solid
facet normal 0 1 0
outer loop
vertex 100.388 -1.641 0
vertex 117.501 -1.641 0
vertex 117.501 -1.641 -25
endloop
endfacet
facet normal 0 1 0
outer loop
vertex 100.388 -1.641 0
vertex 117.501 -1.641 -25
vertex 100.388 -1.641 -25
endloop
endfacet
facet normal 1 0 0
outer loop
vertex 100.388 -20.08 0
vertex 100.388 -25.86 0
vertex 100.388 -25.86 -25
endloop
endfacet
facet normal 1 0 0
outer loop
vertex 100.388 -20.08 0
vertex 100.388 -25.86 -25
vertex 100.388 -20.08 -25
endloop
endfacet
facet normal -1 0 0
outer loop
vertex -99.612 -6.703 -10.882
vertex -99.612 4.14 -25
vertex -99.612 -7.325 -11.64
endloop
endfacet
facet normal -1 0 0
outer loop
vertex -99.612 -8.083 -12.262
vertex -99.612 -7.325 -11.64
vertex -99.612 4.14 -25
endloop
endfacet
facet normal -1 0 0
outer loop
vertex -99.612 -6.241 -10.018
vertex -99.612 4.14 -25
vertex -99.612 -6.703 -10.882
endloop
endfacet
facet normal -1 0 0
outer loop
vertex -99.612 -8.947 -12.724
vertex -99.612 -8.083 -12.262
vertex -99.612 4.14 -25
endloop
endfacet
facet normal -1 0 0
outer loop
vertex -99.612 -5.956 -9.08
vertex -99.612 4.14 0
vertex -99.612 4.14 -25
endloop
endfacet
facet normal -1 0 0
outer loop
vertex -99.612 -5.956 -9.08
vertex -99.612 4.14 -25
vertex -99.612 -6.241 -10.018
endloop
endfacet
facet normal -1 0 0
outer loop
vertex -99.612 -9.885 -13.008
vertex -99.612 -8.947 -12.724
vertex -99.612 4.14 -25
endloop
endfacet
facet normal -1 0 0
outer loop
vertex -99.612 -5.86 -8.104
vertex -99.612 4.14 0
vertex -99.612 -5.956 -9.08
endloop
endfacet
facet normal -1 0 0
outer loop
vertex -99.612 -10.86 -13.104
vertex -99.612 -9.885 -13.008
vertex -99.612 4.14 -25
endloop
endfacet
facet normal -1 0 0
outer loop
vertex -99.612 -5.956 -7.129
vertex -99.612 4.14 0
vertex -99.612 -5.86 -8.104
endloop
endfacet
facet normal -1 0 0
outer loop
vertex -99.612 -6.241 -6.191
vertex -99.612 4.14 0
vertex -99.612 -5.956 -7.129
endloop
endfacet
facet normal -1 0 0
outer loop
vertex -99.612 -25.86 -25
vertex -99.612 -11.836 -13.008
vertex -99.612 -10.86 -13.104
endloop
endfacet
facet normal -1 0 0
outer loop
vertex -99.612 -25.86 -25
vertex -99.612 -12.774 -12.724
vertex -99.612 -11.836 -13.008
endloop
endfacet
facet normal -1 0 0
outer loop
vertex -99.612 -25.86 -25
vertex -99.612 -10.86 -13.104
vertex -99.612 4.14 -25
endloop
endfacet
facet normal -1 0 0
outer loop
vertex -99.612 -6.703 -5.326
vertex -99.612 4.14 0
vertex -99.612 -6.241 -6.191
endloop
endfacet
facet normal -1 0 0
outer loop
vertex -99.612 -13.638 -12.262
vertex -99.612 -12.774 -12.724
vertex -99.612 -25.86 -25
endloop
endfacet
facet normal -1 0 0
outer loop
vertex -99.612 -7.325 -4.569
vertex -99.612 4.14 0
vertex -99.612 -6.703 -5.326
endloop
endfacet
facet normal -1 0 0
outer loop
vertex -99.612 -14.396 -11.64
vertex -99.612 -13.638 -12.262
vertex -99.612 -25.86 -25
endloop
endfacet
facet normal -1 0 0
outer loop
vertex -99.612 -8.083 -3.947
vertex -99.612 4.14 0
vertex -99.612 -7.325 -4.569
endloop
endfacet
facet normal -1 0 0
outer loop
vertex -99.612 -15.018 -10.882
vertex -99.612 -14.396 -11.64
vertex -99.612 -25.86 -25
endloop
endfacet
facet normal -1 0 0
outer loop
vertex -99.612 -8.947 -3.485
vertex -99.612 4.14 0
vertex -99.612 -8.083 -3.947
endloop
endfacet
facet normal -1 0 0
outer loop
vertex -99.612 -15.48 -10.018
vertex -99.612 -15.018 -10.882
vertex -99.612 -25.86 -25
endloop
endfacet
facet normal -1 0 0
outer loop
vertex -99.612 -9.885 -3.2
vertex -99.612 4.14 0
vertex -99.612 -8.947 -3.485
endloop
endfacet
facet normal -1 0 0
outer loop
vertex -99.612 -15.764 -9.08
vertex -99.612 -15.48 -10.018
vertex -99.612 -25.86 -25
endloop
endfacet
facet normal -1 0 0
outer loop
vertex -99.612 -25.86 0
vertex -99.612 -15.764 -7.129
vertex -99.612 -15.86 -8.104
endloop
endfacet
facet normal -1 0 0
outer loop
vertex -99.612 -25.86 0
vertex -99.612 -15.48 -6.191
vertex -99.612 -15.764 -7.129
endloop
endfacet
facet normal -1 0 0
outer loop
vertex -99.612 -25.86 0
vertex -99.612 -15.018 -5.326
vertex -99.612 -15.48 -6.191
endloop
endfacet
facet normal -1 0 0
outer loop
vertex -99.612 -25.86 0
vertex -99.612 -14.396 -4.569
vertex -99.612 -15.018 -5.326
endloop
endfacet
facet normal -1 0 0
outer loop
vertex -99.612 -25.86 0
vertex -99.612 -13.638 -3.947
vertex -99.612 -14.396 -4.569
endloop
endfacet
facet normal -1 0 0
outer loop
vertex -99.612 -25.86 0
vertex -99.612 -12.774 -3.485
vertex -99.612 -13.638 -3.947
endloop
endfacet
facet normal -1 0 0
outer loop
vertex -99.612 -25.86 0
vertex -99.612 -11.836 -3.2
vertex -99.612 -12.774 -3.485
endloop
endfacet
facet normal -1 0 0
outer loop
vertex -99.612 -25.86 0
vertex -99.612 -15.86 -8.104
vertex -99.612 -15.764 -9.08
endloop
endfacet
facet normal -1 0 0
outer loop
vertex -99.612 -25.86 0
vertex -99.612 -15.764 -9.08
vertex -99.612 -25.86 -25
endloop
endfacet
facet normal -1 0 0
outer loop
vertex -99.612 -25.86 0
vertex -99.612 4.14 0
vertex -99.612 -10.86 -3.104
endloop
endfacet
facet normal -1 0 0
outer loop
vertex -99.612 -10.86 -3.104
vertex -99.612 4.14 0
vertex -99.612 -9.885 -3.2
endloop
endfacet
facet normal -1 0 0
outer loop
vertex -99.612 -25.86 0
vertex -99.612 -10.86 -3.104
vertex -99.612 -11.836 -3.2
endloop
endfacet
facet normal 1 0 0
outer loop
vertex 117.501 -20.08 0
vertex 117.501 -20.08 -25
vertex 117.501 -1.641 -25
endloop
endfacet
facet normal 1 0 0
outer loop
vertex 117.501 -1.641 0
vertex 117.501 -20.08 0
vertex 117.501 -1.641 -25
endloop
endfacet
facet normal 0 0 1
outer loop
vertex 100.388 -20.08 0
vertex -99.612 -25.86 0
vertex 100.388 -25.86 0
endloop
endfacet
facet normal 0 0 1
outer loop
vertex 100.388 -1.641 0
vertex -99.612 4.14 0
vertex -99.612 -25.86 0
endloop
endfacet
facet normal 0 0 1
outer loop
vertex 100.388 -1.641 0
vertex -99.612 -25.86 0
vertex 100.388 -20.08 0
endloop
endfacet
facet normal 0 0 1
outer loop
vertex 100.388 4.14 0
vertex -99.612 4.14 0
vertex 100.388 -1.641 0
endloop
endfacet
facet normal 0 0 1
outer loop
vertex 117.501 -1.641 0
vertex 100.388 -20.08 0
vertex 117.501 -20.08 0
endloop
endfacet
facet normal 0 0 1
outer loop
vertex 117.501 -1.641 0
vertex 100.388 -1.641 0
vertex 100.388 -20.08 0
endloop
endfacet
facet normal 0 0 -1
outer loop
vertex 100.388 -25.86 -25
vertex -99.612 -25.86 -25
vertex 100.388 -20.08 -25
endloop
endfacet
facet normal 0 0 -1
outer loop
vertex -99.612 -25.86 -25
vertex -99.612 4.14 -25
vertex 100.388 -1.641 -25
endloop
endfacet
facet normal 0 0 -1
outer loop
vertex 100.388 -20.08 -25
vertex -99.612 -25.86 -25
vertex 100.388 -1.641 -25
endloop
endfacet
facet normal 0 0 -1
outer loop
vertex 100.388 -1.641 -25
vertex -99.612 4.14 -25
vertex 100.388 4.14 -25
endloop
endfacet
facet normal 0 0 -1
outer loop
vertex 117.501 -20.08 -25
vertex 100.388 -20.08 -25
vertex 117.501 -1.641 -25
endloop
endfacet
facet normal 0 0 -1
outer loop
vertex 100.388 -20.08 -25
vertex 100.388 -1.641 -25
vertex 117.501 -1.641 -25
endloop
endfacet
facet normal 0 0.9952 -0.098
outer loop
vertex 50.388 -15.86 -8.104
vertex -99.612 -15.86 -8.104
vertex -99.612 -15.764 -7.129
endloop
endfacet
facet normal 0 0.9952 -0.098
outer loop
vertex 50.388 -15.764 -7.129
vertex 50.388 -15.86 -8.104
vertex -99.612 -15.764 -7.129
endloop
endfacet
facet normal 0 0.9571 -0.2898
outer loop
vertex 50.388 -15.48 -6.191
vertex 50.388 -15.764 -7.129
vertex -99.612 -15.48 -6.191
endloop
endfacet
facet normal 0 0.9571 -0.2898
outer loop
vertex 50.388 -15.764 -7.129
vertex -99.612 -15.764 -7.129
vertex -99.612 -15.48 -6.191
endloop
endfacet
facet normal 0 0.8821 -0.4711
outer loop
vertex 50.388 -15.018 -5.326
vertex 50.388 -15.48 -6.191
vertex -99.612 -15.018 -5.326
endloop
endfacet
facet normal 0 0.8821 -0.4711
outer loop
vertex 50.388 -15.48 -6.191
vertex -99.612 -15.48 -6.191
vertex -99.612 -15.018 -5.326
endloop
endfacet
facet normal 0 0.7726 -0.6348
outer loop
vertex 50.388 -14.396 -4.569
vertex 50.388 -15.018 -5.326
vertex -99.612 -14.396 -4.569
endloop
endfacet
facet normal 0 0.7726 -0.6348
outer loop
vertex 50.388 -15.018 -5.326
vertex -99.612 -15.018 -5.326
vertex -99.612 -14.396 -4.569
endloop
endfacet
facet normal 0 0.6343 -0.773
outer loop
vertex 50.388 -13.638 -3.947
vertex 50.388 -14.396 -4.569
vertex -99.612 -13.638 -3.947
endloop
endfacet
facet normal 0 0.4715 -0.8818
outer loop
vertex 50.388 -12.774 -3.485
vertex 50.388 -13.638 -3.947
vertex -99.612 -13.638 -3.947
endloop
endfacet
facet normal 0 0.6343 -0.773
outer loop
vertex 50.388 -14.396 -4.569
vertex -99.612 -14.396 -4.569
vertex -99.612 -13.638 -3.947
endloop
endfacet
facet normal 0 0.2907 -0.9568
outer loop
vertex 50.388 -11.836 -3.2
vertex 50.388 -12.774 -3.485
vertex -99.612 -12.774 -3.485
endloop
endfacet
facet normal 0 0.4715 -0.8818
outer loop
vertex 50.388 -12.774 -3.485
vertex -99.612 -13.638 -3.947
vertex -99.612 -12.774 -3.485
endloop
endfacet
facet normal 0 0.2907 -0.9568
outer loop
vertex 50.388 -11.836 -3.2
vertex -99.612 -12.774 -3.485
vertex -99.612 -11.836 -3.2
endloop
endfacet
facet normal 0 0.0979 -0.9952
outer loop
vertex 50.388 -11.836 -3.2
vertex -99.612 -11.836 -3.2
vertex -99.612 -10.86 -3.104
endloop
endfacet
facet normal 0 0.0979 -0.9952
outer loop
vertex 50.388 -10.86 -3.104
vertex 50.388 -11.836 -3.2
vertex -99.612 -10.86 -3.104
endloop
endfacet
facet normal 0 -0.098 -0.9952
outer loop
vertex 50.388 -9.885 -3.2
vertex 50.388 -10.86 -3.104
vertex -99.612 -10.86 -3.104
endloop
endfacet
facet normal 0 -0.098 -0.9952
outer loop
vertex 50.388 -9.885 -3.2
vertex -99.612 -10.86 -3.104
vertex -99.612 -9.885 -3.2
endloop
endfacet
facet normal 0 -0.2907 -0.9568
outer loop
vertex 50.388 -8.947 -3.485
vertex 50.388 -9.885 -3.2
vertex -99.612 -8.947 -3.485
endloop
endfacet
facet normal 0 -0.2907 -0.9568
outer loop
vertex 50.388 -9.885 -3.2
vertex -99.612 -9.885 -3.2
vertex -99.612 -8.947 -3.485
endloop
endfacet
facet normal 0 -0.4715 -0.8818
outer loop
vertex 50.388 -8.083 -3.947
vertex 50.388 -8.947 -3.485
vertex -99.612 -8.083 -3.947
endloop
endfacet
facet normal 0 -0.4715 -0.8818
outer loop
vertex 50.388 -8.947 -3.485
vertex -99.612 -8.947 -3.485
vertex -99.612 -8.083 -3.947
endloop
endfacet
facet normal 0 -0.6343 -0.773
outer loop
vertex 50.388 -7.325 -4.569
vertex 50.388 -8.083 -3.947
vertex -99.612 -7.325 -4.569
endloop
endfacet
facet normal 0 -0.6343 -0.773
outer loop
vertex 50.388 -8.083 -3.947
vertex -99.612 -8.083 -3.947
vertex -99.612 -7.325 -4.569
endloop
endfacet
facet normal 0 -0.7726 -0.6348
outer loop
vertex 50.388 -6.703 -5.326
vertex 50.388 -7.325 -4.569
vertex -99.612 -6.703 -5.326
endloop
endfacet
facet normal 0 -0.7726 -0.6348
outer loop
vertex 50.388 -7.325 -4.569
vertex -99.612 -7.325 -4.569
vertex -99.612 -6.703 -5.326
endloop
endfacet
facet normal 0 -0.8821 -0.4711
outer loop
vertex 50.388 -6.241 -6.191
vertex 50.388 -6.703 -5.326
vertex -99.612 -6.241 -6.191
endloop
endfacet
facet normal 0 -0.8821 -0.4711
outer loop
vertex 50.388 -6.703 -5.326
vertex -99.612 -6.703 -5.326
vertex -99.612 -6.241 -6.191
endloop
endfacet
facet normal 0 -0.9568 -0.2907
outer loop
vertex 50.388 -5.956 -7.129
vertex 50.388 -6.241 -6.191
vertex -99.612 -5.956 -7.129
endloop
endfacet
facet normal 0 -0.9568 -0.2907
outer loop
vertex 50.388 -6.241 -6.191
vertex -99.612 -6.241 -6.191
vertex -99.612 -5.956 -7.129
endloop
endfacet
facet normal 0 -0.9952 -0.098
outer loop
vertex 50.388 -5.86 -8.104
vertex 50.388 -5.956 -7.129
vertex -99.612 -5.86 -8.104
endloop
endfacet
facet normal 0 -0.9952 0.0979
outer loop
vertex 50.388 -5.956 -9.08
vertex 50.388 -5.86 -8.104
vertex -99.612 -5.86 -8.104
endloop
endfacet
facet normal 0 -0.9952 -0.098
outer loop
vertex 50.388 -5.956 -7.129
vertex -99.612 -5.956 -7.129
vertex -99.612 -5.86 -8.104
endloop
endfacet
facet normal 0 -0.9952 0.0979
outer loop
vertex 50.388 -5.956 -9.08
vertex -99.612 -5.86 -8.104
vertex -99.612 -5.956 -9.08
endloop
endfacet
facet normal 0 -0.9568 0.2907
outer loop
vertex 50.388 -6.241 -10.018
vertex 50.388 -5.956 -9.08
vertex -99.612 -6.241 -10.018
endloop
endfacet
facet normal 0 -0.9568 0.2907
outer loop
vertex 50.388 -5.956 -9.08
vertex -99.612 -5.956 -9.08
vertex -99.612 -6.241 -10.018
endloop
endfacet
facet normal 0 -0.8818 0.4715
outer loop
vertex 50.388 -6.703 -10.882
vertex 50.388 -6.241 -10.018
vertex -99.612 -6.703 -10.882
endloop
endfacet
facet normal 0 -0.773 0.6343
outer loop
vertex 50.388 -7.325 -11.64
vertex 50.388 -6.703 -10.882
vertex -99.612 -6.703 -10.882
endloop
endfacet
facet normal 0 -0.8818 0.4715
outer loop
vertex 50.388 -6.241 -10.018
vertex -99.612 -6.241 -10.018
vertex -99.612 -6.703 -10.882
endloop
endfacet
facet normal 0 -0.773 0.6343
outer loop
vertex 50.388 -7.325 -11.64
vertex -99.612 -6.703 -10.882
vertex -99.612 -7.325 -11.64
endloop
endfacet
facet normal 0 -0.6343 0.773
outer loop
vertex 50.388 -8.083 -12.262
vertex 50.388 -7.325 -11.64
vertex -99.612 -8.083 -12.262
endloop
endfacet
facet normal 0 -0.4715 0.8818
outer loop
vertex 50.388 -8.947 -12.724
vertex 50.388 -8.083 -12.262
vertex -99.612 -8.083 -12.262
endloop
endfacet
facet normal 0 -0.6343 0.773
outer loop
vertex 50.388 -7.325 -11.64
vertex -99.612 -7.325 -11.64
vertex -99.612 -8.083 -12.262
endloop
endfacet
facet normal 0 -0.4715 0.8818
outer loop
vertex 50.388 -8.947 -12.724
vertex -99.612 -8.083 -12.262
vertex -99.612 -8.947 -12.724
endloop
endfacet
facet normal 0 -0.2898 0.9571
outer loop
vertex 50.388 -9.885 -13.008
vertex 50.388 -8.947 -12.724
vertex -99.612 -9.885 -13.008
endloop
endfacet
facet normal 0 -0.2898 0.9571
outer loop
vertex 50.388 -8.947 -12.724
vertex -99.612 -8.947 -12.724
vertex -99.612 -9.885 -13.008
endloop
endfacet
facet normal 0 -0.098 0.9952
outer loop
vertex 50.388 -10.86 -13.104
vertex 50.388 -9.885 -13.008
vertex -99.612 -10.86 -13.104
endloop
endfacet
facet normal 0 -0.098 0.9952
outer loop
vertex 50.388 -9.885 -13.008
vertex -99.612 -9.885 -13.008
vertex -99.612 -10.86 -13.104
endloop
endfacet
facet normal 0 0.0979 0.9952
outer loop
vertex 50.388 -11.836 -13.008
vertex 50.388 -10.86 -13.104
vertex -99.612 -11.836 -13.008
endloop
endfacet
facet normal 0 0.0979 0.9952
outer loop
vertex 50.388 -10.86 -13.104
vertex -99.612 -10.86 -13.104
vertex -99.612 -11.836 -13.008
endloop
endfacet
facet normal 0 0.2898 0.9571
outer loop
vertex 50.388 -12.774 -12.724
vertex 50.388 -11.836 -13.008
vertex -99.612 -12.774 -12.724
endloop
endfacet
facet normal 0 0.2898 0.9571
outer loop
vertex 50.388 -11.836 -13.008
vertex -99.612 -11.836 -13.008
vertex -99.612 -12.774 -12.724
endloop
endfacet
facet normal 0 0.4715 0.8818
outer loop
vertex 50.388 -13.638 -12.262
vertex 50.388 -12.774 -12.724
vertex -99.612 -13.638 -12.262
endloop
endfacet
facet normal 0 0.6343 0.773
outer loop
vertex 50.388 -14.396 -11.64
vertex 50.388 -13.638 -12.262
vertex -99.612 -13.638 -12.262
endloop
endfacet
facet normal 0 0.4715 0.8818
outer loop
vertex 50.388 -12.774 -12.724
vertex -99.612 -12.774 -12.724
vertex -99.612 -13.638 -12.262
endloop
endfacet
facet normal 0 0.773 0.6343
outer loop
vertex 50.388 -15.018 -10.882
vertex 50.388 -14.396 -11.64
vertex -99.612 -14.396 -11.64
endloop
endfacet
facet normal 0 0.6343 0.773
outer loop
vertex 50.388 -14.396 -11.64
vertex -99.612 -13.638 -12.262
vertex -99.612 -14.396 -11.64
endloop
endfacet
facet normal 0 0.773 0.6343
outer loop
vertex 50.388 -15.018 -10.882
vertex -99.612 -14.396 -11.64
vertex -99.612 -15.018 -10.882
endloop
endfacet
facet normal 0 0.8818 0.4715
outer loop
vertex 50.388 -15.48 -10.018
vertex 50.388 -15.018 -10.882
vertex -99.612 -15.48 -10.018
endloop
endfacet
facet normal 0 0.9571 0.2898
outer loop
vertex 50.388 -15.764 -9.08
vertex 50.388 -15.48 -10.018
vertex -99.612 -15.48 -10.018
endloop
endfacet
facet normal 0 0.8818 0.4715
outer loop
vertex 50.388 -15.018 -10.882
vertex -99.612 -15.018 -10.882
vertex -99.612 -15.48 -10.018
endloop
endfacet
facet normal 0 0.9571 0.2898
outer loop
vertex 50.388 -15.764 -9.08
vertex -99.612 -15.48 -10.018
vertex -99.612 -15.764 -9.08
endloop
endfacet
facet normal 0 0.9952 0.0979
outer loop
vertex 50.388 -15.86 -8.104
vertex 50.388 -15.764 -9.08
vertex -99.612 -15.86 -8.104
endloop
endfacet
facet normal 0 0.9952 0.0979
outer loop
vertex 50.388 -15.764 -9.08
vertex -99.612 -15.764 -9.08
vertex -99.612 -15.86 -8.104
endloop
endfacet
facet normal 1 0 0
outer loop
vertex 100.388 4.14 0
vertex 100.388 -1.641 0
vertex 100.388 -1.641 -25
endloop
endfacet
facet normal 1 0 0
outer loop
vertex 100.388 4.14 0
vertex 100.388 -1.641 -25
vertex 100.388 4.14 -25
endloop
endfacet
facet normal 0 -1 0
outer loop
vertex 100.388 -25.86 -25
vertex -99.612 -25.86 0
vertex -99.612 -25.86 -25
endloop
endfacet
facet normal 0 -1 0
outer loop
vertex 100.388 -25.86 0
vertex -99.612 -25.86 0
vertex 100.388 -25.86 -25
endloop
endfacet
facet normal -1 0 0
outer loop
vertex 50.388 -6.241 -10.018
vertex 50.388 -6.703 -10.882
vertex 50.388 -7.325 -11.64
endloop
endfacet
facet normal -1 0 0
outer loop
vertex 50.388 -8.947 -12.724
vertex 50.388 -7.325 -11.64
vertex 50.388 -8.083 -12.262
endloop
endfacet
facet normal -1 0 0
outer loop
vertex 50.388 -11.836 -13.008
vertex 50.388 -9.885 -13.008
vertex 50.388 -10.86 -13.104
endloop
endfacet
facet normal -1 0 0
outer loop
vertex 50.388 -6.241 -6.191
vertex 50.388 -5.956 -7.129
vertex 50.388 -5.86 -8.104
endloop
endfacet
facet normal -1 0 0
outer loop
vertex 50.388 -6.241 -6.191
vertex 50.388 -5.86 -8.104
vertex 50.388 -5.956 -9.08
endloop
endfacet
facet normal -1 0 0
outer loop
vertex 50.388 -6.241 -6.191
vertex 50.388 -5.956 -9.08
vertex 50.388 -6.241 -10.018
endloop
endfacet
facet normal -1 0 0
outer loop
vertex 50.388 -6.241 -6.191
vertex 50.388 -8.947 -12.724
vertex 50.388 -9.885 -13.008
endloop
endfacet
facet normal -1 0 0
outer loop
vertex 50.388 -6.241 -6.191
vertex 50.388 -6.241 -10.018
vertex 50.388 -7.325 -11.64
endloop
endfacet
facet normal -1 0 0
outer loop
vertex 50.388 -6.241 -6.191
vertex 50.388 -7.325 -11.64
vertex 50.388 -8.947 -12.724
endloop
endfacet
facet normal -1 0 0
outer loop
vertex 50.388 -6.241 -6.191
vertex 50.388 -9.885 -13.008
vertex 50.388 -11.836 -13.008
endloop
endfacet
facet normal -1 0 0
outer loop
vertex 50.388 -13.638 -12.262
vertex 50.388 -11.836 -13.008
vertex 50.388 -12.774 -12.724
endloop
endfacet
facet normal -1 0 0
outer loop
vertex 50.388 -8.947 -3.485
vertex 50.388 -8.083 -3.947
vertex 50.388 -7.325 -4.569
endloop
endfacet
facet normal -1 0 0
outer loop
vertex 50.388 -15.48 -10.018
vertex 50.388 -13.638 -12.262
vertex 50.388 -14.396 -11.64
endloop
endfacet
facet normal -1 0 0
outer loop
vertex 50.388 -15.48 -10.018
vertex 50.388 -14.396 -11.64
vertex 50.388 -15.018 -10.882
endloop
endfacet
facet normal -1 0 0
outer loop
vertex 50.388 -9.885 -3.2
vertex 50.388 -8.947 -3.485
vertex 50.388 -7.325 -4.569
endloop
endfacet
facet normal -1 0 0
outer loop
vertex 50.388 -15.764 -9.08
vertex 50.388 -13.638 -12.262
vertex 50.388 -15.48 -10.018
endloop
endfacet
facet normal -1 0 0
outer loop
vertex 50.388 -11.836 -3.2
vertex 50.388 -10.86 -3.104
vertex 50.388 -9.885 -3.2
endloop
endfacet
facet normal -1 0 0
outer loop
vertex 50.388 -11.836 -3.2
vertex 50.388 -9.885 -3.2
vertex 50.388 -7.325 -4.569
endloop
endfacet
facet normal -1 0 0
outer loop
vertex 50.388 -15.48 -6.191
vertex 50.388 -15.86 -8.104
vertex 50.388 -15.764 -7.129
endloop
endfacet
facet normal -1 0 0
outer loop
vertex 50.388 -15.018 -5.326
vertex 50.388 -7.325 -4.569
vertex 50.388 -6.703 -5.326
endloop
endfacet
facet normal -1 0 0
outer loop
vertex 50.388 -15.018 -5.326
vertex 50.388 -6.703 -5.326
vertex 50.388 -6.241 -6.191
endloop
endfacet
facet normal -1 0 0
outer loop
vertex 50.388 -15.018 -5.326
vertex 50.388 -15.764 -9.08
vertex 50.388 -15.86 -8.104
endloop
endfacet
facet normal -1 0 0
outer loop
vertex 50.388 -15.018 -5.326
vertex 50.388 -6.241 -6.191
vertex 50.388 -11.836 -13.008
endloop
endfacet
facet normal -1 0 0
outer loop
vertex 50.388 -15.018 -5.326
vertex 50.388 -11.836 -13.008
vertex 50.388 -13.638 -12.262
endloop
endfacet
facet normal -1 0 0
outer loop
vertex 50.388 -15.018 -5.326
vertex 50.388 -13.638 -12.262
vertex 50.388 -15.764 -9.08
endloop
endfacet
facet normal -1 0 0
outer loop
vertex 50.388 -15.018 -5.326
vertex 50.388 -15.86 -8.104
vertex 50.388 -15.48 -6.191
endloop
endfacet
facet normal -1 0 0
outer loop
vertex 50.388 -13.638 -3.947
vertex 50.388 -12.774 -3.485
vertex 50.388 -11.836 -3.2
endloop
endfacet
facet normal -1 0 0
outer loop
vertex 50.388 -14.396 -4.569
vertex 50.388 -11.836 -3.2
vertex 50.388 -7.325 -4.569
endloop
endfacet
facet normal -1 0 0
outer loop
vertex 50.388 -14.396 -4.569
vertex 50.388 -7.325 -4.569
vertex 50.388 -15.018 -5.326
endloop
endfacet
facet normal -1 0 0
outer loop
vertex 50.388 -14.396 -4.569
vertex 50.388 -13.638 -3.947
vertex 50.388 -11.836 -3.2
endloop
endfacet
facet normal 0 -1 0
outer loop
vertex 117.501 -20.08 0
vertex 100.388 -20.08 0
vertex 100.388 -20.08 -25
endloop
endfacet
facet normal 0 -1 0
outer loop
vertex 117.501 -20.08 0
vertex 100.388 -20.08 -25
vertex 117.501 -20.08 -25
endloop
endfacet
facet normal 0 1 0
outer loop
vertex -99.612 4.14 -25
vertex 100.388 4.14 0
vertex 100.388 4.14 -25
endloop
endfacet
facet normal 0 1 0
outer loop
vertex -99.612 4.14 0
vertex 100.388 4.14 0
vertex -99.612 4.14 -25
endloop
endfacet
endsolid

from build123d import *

# Parameters (mm, degrees)
F1_DEPTH = 25
F2_R     = 5
F3_DEPTH = 150


with BuildPart() as f1:
    # F0 (on Top) → F1 (new body)
    with BuildSketch(Plane.XY):
        Polygon((31.593338, 4.139638), (-99.612067, 4.139638), (-99.612067, -25.860362), (31.593338, -25.860362), (81.593338, -25.860362), (100.387933, -25.860362), (100.387933, -20.079653), (117.500933, -20.079653), (117.500933, -1.641072), (100.387933, -1.641072), (100.387933, 4.139638), (81.593338, 4.139638), align=None)
    extrude(amount=-F1_DEPTH)

    # F2 (on face) → F3 (cut)
    with BuildSketch(Plane(origin=(-99.612067, 0, 0), x_dir=(0, -1, 0), z_dir=(-1, 0, 0))):
        with Locations((10.860362, -8.104307)):
            Circle(F2_R)
    extrude(amount=-F3_DEPTH, mode=Mode.SUBTRACT)


solid = f1.part
